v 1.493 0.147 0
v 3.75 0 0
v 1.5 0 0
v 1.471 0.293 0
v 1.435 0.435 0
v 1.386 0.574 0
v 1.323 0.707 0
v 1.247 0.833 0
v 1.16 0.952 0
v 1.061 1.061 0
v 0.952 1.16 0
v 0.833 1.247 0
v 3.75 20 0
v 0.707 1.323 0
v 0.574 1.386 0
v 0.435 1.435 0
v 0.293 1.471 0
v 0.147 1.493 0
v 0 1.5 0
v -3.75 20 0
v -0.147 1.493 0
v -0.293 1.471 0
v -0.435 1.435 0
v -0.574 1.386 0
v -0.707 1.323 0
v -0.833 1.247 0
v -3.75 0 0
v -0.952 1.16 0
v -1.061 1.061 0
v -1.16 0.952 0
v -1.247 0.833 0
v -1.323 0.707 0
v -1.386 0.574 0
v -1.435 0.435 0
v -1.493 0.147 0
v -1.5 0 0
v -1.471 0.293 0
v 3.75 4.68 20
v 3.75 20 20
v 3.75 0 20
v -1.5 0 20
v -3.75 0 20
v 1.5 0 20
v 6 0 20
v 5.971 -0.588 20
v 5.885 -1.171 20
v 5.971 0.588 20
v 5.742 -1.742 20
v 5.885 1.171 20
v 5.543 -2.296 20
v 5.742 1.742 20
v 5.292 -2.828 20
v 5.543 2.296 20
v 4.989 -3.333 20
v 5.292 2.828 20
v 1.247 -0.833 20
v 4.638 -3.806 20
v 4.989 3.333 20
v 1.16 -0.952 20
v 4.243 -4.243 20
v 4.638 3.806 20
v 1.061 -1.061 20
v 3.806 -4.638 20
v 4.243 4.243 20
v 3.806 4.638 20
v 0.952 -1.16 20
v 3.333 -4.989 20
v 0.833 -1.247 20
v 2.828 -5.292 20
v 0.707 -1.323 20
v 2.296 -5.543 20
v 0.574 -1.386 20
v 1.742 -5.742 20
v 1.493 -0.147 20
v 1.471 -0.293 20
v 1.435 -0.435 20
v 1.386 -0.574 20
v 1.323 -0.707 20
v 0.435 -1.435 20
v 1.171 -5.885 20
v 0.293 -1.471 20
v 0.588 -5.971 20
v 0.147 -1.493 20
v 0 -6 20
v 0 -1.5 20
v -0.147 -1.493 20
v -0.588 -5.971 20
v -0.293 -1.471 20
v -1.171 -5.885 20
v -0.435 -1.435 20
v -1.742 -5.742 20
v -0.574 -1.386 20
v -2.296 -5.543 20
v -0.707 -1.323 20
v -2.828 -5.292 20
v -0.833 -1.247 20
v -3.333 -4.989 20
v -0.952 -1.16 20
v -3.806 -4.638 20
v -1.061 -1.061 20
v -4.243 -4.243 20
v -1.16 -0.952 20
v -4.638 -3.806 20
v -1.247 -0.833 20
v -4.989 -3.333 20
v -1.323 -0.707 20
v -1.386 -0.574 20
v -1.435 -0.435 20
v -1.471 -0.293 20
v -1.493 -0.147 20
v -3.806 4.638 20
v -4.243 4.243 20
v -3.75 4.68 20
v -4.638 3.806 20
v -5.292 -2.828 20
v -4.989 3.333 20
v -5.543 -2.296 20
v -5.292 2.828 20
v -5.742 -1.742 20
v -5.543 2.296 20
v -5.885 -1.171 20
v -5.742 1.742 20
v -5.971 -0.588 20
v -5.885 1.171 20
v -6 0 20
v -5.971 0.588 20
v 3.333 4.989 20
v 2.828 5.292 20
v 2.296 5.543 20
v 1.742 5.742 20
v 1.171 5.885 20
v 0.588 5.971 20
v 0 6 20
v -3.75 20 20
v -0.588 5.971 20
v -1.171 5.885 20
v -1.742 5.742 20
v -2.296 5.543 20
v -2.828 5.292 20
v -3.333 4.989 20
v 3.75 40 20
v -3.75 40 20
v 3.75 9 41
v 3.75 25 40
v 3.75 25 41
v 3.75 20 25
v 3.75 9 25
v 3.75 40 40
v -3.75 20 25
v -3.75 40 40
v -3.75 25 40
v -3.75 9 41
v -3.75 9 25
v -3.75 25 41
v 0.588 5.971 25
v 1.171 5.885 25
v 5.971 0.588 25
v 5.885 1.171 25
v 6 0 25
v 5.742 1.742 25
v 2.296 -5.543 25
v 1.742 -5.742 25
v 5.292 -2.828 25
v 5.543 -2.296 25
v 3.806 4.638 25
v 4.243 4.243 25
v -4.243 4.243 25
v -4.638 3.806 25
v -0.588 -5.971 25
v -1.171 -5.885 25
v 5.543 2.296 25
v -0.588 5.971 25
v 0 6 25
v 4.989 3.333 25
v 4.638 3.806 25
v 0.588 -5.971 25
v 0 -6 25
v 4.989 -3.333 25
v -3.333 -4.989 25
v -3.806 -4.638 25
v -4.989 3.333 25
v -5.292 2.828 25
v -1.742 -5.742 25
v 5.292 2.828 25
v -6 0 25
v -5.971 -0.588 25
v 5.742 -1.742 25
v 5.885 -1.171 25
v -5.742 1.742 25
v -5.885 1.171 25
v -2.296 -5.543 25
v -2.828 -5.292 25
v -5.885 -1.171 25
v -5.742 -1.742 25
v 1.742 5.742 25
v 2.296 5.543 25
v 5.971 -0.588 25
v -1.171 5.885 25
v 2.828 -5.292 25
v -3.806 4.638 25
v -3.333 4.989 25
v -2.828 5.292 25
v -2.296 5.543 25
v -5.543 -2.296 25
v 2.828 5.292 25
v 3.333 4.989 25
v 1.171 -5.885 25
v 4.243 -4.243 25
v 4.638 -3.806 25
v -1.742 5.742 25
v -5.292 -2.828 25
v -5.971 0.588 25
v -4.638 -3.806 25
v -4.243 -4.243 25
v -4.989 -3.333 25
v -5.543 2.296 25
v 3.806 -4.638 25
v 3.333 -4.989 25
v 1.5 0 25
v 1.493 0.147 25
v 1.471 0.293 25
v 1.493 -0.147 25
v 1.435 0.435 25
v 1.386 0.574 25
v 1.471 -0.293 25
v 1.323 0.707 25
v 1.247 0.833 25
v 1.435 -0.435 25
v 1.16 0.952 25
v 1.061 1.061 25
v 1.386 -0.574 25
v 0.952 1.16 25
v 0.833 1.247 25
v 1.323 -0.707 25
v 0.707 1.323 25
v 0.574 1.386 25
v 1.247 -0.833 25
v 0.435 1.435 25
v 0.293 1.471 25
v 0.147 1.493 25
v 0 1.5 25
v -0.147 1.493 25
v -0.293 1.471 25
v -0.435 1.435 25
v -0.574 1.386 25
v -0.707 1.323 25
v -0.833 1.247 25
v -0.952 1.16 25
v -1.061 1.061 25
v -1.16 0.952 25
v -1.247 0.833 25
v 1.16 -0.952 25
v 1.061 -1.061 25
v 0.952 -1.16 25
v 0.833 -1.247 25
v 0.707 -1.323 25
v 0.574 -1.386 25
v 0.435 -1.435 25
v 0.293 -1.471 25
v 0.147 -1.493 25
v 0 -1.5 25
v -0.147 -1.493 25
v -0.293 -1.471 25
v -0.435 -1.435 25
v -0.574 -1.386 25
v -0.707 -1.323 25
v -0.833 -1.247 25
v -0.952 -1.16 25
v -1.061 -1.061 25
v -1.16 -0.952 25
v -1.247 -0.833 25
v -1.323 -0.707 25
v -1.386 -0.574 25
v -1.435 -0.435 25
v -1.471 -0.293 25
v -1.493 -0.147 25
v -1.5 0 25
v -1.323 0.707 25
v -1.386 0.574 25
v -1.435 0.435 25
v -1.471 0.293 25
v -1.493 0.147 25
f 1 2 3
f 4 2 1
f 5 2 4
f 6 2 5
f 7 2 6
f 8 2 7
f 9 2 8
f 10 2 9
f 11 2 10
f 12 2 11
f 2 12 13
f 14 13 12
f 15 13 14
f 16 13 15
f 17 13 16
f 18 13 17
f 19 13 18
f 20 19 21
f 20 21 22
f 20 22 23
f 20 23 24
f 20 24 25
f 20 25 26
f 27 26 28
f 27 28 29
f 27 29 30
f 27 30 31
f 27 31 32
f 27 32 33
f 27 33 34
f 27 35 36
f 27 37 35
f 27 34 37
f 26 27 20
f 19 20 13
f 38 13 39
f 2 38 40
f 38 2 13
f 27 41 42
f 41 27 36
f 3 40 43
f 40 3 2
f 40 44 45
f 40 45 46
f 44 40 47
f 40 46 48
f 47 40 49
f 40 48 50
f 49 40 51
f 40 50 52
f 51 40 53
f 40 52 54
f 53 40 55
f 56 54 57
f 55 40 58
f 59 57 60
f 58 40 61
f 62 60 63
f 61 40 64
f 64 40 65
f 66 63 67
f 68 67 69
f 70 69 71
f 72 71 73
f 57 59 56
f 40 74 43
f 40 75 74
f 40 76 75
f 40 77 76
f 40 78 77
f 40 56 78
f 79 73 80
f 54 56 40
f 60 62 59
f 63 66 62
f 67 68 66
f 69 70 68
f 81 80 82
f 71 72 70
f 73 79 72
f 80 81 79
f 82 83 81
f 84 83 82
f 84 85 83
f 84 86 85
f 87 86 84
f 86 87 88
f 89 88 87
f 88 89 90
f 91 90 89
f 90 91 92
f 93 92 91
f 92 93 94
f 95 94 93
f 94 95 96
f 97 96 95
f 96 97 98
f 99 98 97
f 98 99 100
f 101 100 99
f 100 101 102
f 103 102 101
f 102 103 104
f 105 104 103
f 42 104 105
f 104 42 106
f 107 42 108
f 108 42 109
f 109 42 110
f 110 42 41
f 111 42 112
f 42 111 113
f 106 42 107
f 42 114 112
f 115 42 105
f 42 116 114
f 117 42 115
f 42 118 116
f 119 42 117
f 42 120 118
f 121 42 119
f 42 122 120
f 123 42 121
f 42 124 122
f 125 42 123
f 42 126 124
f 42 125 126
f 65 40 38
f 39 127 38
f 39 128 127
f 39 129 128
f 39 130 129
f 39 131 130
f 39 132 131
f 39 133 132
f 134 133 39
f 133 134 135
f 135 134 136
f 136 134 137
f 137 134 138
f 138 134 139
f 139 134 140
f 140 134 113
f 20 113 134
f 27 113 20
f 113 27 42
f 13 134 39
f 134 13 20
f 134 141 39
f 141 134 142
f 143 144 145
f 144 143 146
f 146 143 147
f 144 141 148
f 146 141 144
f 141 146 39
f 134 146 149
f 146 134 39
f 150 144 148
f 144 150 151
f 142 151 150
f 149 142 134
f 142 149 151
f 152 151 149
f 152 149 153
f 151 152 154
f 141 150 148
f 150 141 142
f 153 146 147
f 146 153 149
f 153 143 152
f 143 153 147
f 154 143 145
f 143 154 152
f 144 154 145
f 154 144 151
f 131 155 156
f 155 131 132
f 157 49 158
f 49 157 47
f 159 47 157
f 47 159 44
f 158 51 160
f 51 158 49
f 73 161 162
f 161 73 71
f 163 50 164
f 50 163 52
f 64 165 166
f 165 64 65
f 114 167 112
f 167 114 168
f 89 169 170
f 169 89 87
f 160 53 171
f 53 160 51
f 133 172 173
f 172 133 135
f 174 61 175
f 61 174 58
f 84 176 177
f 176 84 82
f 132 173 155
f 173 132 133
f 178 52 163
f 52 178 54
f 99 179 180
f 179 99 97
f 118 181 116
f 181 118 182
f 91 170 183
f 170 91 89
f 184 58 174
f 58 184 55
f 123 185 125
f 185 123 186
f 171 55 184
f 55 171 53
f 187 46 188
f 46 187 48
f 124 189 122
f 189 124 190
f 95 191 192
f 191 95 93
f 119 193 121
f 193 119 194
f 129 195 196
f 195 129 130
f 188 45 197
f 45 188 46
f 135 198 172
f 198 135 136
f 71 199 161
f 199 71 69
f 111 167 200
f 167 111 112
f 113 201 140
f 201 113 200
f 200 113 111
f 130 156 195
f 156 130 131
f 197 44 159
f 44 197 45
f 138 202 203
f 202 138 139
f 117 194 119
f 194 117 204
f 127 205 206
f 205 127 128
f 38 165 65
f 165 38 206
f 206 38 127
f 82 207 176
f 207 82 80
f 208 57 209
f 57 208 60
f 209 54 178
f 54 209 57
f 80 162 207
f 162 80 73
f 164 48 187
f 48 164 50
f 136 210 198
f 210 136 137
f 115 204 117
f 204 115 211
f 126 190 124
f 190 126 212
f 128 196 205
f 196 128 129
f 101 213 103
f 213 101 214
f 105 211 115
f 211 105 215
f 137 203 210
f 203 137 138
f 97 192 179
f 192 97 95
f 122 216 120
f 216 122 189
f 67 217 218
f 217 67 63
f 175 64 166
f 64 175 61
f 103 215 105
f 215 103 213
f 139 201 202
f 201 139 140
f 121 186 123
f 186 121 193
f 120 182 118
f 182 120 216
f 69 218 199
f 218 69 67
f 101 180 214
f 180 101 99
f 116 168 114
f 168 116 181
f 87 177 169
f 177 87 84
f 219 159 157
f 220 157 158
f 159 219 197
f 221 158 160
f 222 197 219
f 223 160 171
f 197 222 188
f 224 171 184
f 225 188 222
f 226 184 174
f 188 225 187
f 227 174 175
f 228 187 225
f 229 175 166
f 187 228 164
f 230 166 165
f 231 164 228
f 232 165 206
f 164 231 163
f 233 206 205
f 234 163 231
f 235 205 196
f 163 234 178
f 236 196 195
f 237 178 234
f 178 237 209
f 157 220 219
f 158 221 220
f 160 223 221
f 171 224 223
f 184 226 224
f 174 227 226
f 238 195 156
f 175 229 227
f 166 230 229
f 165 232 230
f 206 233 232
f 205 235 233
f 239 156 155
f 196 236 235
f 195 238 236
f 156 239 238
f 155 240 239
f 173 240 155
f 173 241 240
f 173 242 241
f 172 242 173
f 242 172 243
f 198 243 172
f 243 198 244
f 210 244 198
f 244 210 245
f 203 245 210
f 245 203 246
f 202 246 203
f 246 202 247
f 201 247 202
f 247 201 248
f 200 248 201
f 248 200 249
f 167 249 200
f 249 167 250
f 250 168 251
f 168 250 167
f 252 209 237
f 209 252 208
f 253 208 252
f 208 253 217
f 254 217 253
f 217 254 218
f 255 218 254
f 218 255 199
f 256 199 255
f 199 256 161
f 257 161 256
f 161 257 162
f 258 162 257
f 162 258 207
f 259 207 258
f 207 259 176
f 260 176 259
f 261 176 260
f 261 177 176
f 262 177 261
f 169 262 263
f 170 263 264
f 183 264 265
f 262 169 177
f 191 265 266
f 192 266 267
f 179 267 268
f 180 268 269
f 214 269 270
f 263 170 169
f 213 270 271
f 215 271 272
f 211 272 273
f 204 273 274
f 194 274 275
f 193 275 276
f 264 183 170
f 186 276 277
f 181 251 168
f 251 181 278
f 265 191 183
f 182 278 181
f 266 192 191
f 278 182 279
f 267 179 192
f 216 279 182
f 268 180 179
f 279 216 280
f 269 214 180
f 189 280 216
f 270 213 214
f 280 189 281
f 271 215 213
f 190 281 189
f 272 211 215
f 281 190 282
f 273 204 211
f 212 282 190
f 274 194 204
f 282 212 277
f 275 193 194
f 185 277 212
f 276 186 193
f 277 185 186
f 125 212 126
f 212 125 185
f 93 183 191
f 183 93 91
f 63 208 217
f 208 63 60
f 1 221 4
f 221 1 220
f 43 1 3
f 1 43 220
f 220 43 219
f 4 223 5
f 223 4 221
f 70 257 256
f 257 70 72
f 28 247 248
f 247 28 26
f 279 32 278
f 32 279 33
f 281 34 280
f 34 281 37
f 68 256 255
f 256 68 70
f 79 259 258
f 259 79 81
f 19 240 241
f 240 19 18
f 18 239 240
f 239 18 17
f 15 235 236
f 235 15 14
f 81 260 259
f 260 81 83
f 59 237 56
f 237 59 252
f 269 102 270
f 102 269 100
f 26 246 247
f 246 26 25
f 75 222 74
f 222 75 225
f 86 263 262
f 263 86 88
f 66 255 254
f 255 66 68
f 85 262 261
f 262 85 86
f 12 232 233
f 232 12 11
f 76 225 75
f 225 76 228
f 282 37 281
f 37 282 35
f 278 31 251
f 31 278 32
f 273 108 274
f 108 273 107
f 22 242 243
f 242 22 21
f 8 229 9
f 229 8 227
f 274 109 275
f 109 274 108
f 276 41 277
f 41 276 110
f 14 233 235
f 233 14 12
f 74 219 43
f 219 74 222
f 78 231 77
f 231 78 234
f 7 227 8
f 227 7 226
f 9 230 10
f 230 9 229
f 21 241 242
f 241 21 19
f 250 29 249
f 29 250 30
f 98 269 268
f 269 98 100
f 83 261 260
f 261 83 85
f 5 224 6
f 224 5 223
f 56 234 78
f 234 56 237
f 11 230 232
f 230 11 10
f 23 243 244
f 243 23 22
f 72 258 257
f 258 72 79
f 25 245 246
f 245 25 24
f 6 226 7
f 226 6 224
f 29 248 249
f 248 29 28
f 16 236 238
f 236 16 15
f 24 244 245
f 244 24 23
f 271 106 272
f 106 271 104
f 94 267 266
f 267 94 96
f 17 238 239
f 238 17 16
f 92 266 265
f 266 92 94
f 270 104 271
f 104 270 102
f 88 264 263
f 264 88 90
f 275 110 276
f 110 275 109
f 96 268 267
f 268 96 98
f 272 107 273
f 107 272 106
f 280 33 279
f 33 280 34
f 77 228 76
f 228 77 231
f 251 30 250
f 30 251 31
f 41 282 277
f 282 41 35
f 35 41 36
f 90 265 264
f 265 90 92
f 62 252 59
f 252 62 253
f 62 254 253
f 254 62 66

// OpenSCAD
// Hose-barb reducer: 8 mm ID -> 5 mm ID
// Print orientation: standing upright along +Z

$fn = 64;

// ---- Dimensions (mm) ----
id_8     = 8.0;   // 8 mm tubing inner diameter
id_5     = 5.0;   // 5 mm tubing inner diameter
bore     = 3.0;   // through-bore diameter
base_d   = 7.5;   // barb outer diameter at bottom (8 mm side)
top_d    = 9.5;   // barb outer diameter at top (8 mm side)
len_8    = 20;    // height of 8 mm tubing section
collar_d = 12.0;  // collar diameter (z = 20 to 25)
len_5    = 16;    // height of 5 mm tubing section (z = 25 to 41)
eps      = 0.5;   // cutter overshoot

// ---- Derived ----
total_h = len_8 + 5 + len_5;   // 41 mm overall height

// ---- Model ----
difference() {
    union() {
        // 8 mm tubing barbs (sawtooth profile)
        for (z = [0, len_8])
            translate([0, 0, z])
                linear_extrude(height = len_8)
                    polygon([
                        [-base_d/2, z],
                        [ base_d/2, z],
                        [ base_d/2, z + len_8],
                        [top_d/2, z + len_8],
                        [-top_d/2, z + len_8],
                        [-base_d/2, z + len_8]
                    ]);

        // Collar
        translate([0, 0, len_8])
            cylinder(d = collar_d, h = 5);

        // 5 mm tubing barbs (tapered, stepped profile)
        for (z = [len_8 + 5, total_h - len_5])
            translate([0, 0, z])
                linear_extrude(height = len_5)
                    polygon([
                        [-base_d/2, z],
                        [ base_d/2, z],
                        [ base_d/2, z - len_5],
                        [top_d/2, z - len_5],
                        [-top_d/2, z - len_5],
                        [-base_d/2, z - len_5]
                    ]);
    }

    // Through-bore
    translate([0, 0, -eps])
        cylinder(d = bore, h = total_h + 2*eps);
}
